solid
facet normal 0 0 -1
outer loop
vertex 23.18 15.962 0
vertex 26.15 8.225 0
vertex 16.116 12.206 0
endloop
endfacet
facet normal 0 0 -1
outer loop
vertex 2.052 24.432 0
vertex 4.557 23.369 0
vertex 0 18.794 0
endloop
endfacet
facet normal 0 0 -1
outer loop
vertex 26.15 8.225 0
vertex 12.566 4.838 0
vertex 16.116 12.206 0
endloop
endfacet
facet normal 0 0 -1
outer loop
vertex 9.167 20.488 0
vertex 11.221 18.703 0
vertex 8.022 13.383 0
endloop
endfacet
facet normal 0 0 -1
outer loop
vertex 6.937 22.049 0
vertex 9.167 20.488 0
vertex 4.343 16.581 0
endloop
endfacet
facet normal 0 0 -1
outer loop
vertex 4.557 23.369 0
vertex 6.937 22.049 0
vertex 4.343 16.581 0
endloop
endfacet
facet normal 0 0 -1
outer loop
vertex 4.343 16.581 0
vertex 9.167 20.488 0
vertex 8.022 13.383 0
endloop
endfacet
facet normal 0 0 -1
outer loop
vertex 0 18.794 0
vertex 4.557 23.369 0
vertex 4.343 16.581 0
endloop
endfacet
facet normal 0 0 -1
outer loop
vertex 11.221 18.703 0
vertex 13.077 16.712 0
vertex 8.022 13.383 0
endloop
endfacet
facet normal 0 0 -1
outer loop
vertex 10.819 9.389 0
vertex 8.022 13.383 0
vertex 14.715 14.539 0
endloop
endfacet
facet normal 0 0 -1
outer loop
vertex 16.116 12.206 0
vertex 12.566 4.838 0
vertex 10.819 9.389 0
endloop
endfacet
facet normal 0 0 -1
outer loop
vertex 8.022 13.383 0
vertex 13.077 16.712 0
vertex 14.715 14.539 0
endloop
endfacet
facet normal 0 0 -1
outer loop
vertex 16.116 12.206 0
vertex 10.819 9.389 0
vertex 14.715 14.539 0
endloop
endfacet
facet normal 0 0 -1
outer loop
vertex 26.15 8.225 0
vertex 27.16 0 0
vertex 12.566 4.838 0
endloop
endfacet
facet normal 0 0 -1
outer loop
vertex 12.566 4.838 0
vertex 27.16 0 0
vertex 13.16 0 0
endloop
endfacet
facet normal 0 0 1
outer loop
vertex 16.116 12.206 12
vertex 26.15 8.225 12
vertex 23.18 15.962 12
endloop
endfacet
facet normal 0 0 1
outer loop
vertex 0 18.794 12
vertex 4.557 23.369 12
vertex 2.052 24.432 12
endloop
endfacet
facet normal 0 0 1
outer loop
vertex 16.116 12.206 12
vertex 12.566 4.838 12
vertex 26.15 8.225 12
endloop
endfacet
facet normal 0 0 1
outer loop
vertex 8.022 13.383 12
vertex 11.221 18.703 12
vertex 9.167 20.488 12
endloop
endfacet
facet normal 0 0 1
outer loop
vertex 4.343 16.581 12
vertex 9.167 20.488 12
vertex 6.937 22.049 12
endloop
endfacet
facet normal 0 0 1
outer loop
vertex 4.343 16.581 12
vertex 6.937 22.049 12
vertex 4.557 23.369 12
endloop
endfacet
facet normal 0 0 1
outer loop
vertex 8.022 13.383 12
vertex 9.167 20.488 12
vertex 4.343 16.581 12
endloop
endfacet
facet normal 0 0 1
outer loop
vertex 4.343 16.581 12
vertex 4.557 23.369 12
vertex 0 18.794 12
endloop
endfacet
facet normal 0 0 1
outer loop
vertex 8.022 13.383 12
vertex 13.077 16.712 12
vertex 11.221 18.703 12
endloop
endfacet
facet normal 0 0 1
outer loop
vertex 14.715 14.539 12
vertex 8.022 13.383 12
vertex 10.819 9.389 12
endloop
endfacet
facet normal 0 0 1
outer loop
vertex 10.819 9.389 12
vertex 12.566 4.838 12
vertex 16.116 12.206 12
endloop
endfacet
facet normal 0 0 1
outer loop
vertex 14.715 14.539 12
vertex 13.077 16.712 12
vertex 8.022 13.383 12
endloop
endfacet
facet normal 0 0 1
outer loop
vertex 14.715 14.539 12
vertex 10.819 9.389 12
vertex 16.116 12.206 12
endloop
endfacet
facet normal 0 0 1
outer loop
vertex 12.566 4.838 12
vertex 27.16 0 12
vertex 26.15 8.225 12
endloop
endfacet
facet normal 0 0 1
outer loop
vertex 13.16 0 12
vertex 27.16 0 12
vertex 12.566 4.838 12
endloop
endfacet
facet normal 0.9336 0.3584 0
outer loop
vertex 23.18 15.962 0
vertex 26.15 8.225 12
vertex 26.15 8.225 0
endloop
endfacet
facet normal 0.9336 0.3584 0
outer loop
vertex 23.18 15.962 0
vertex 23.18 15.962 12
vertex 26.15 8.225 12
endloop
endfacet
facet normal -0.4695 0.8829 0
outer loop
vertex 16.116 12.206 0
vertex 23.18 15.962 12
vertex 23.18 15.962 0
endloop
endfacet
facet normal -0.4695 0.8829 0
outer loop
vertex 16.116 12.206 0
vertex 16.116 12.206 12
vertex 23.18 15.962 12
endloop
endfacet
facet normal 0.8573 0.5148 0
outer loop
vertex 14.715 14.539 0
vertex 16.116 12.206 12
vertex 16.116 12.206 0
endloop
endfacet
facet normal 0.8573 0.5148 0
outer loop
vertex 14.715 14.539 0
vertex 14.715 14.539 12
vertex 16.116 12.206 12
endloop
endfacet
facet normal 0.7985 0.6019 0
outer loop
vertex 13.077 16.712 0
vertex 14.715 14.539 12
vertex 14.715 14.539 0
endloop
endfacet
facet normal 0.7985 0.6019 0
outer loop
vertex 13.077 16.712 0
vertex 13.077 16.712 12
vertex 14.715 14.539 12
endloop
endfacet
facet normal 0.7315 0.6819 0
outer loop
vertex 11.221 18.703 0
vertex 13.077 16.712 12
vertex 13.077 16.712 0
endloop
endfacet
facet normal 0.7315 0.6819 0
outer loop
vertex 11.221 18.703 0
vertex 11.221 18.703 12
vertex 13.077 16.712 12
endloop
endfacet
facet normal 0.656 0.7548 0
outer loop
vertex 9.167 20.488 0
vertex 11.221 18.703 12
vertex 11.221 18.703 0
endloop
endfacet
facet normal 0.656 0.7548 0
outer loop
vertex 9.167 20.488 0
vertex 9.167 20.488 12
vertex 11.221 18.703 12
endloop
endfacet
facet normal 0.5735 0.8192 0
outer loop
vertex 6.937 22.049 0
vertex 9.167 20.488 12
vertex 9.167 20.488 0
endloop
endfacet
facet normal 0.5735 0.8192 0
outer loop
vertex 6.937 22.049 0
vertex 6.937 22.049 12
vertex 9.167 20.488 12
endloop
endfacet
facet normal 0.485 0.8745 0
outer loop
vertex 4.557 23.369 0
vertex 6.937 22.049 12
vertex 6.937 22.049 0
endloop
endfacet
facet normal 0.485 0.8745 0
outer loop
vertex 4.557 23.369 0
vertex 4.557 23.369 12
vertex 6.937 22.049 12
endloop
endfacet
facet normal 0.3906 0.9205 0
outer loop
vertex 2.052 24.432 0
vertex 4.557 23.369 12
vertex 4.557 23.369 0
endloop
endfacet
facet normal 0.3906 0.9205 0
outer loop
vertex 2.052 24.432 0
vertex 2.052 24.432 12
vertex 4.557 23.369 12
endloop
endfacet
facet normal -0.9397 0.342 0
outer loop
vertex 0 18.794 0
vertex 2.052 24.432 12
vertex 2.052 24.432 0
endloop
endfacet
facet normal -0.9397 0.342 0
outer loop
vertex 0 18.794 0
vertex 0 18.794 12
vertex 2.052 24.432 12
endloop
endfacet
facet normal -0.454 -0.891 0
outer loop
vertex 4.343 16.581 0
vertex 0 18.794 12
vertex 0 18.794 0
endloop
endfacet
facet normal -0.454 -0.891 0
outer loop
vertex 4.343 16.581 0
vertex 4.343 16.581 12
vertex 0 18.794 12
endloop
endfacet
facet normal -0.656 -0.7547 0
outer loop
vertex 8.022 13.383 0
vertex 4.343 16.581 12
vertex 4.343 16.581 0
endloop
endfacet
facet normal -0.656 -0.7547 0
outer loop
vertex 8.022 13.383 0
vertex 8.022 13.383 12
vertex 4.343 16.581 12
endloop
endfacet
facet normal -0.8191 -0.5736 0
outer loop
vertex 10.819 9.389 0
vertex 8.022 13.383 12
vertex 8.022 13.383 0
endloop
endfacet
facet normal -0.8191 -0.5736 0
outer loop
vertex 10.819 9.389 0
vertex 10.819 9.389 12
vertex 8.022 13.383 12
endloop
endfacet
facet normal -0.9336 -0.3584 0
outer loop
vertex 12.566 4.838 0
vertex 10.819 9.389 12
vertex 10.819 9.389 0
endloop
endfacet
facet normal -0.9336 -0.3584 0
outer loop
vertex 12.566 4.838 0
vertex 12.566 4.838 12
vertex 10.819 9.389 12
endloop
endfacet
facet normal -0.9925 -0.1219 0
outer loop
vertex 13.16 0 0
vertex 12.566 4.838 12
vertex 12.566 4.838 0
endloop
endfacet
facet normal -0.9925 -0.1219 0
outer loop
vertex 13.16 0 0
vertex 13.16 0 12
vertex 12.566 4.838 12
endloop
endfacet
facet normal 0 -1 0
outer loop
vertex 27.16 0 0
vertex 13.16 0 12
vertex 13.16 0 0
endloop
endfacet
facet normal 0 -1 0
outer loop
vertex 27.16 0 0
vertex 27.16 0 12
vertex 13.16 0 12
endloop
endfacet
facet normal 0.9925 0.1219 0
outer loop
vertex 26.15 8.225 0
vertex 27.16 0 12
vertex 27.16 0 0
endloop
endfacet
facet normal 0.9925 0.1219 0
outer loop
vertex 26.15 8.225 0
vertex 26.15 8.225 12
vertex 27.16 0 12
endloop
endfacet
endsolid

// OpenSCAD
$fn = 32;

// ----------------------------------------------------------------------
// Arc stop: segment, 12 mm thick
// ----------------------------------------------------------------------

// --- parameters (mm) ---
profile_height = 12;      // extrusion height
profile_points = 17;      // points of the closed outline

profile = [[27.16, 0], [26.15, 8.225], [23.18, 15.962], [16.116, 12.206], [14.715, 14.539], [13.077, 16.712], [11.221, 18.703], [9.167, 20.488], [6.937, 22.049], [4.557, 23.369], [2.052, 24.432], [0, 18.794], [4.343, 16.581], [8.022, 13.383], [10.819, 9.389], [12.566, 4.838], [13.16, 0]];  // single closed polygon, 17 points, counter clockwise

// --- the one profile operation ---
linear_extrude(height = profile_height) polygon(points = profile);
